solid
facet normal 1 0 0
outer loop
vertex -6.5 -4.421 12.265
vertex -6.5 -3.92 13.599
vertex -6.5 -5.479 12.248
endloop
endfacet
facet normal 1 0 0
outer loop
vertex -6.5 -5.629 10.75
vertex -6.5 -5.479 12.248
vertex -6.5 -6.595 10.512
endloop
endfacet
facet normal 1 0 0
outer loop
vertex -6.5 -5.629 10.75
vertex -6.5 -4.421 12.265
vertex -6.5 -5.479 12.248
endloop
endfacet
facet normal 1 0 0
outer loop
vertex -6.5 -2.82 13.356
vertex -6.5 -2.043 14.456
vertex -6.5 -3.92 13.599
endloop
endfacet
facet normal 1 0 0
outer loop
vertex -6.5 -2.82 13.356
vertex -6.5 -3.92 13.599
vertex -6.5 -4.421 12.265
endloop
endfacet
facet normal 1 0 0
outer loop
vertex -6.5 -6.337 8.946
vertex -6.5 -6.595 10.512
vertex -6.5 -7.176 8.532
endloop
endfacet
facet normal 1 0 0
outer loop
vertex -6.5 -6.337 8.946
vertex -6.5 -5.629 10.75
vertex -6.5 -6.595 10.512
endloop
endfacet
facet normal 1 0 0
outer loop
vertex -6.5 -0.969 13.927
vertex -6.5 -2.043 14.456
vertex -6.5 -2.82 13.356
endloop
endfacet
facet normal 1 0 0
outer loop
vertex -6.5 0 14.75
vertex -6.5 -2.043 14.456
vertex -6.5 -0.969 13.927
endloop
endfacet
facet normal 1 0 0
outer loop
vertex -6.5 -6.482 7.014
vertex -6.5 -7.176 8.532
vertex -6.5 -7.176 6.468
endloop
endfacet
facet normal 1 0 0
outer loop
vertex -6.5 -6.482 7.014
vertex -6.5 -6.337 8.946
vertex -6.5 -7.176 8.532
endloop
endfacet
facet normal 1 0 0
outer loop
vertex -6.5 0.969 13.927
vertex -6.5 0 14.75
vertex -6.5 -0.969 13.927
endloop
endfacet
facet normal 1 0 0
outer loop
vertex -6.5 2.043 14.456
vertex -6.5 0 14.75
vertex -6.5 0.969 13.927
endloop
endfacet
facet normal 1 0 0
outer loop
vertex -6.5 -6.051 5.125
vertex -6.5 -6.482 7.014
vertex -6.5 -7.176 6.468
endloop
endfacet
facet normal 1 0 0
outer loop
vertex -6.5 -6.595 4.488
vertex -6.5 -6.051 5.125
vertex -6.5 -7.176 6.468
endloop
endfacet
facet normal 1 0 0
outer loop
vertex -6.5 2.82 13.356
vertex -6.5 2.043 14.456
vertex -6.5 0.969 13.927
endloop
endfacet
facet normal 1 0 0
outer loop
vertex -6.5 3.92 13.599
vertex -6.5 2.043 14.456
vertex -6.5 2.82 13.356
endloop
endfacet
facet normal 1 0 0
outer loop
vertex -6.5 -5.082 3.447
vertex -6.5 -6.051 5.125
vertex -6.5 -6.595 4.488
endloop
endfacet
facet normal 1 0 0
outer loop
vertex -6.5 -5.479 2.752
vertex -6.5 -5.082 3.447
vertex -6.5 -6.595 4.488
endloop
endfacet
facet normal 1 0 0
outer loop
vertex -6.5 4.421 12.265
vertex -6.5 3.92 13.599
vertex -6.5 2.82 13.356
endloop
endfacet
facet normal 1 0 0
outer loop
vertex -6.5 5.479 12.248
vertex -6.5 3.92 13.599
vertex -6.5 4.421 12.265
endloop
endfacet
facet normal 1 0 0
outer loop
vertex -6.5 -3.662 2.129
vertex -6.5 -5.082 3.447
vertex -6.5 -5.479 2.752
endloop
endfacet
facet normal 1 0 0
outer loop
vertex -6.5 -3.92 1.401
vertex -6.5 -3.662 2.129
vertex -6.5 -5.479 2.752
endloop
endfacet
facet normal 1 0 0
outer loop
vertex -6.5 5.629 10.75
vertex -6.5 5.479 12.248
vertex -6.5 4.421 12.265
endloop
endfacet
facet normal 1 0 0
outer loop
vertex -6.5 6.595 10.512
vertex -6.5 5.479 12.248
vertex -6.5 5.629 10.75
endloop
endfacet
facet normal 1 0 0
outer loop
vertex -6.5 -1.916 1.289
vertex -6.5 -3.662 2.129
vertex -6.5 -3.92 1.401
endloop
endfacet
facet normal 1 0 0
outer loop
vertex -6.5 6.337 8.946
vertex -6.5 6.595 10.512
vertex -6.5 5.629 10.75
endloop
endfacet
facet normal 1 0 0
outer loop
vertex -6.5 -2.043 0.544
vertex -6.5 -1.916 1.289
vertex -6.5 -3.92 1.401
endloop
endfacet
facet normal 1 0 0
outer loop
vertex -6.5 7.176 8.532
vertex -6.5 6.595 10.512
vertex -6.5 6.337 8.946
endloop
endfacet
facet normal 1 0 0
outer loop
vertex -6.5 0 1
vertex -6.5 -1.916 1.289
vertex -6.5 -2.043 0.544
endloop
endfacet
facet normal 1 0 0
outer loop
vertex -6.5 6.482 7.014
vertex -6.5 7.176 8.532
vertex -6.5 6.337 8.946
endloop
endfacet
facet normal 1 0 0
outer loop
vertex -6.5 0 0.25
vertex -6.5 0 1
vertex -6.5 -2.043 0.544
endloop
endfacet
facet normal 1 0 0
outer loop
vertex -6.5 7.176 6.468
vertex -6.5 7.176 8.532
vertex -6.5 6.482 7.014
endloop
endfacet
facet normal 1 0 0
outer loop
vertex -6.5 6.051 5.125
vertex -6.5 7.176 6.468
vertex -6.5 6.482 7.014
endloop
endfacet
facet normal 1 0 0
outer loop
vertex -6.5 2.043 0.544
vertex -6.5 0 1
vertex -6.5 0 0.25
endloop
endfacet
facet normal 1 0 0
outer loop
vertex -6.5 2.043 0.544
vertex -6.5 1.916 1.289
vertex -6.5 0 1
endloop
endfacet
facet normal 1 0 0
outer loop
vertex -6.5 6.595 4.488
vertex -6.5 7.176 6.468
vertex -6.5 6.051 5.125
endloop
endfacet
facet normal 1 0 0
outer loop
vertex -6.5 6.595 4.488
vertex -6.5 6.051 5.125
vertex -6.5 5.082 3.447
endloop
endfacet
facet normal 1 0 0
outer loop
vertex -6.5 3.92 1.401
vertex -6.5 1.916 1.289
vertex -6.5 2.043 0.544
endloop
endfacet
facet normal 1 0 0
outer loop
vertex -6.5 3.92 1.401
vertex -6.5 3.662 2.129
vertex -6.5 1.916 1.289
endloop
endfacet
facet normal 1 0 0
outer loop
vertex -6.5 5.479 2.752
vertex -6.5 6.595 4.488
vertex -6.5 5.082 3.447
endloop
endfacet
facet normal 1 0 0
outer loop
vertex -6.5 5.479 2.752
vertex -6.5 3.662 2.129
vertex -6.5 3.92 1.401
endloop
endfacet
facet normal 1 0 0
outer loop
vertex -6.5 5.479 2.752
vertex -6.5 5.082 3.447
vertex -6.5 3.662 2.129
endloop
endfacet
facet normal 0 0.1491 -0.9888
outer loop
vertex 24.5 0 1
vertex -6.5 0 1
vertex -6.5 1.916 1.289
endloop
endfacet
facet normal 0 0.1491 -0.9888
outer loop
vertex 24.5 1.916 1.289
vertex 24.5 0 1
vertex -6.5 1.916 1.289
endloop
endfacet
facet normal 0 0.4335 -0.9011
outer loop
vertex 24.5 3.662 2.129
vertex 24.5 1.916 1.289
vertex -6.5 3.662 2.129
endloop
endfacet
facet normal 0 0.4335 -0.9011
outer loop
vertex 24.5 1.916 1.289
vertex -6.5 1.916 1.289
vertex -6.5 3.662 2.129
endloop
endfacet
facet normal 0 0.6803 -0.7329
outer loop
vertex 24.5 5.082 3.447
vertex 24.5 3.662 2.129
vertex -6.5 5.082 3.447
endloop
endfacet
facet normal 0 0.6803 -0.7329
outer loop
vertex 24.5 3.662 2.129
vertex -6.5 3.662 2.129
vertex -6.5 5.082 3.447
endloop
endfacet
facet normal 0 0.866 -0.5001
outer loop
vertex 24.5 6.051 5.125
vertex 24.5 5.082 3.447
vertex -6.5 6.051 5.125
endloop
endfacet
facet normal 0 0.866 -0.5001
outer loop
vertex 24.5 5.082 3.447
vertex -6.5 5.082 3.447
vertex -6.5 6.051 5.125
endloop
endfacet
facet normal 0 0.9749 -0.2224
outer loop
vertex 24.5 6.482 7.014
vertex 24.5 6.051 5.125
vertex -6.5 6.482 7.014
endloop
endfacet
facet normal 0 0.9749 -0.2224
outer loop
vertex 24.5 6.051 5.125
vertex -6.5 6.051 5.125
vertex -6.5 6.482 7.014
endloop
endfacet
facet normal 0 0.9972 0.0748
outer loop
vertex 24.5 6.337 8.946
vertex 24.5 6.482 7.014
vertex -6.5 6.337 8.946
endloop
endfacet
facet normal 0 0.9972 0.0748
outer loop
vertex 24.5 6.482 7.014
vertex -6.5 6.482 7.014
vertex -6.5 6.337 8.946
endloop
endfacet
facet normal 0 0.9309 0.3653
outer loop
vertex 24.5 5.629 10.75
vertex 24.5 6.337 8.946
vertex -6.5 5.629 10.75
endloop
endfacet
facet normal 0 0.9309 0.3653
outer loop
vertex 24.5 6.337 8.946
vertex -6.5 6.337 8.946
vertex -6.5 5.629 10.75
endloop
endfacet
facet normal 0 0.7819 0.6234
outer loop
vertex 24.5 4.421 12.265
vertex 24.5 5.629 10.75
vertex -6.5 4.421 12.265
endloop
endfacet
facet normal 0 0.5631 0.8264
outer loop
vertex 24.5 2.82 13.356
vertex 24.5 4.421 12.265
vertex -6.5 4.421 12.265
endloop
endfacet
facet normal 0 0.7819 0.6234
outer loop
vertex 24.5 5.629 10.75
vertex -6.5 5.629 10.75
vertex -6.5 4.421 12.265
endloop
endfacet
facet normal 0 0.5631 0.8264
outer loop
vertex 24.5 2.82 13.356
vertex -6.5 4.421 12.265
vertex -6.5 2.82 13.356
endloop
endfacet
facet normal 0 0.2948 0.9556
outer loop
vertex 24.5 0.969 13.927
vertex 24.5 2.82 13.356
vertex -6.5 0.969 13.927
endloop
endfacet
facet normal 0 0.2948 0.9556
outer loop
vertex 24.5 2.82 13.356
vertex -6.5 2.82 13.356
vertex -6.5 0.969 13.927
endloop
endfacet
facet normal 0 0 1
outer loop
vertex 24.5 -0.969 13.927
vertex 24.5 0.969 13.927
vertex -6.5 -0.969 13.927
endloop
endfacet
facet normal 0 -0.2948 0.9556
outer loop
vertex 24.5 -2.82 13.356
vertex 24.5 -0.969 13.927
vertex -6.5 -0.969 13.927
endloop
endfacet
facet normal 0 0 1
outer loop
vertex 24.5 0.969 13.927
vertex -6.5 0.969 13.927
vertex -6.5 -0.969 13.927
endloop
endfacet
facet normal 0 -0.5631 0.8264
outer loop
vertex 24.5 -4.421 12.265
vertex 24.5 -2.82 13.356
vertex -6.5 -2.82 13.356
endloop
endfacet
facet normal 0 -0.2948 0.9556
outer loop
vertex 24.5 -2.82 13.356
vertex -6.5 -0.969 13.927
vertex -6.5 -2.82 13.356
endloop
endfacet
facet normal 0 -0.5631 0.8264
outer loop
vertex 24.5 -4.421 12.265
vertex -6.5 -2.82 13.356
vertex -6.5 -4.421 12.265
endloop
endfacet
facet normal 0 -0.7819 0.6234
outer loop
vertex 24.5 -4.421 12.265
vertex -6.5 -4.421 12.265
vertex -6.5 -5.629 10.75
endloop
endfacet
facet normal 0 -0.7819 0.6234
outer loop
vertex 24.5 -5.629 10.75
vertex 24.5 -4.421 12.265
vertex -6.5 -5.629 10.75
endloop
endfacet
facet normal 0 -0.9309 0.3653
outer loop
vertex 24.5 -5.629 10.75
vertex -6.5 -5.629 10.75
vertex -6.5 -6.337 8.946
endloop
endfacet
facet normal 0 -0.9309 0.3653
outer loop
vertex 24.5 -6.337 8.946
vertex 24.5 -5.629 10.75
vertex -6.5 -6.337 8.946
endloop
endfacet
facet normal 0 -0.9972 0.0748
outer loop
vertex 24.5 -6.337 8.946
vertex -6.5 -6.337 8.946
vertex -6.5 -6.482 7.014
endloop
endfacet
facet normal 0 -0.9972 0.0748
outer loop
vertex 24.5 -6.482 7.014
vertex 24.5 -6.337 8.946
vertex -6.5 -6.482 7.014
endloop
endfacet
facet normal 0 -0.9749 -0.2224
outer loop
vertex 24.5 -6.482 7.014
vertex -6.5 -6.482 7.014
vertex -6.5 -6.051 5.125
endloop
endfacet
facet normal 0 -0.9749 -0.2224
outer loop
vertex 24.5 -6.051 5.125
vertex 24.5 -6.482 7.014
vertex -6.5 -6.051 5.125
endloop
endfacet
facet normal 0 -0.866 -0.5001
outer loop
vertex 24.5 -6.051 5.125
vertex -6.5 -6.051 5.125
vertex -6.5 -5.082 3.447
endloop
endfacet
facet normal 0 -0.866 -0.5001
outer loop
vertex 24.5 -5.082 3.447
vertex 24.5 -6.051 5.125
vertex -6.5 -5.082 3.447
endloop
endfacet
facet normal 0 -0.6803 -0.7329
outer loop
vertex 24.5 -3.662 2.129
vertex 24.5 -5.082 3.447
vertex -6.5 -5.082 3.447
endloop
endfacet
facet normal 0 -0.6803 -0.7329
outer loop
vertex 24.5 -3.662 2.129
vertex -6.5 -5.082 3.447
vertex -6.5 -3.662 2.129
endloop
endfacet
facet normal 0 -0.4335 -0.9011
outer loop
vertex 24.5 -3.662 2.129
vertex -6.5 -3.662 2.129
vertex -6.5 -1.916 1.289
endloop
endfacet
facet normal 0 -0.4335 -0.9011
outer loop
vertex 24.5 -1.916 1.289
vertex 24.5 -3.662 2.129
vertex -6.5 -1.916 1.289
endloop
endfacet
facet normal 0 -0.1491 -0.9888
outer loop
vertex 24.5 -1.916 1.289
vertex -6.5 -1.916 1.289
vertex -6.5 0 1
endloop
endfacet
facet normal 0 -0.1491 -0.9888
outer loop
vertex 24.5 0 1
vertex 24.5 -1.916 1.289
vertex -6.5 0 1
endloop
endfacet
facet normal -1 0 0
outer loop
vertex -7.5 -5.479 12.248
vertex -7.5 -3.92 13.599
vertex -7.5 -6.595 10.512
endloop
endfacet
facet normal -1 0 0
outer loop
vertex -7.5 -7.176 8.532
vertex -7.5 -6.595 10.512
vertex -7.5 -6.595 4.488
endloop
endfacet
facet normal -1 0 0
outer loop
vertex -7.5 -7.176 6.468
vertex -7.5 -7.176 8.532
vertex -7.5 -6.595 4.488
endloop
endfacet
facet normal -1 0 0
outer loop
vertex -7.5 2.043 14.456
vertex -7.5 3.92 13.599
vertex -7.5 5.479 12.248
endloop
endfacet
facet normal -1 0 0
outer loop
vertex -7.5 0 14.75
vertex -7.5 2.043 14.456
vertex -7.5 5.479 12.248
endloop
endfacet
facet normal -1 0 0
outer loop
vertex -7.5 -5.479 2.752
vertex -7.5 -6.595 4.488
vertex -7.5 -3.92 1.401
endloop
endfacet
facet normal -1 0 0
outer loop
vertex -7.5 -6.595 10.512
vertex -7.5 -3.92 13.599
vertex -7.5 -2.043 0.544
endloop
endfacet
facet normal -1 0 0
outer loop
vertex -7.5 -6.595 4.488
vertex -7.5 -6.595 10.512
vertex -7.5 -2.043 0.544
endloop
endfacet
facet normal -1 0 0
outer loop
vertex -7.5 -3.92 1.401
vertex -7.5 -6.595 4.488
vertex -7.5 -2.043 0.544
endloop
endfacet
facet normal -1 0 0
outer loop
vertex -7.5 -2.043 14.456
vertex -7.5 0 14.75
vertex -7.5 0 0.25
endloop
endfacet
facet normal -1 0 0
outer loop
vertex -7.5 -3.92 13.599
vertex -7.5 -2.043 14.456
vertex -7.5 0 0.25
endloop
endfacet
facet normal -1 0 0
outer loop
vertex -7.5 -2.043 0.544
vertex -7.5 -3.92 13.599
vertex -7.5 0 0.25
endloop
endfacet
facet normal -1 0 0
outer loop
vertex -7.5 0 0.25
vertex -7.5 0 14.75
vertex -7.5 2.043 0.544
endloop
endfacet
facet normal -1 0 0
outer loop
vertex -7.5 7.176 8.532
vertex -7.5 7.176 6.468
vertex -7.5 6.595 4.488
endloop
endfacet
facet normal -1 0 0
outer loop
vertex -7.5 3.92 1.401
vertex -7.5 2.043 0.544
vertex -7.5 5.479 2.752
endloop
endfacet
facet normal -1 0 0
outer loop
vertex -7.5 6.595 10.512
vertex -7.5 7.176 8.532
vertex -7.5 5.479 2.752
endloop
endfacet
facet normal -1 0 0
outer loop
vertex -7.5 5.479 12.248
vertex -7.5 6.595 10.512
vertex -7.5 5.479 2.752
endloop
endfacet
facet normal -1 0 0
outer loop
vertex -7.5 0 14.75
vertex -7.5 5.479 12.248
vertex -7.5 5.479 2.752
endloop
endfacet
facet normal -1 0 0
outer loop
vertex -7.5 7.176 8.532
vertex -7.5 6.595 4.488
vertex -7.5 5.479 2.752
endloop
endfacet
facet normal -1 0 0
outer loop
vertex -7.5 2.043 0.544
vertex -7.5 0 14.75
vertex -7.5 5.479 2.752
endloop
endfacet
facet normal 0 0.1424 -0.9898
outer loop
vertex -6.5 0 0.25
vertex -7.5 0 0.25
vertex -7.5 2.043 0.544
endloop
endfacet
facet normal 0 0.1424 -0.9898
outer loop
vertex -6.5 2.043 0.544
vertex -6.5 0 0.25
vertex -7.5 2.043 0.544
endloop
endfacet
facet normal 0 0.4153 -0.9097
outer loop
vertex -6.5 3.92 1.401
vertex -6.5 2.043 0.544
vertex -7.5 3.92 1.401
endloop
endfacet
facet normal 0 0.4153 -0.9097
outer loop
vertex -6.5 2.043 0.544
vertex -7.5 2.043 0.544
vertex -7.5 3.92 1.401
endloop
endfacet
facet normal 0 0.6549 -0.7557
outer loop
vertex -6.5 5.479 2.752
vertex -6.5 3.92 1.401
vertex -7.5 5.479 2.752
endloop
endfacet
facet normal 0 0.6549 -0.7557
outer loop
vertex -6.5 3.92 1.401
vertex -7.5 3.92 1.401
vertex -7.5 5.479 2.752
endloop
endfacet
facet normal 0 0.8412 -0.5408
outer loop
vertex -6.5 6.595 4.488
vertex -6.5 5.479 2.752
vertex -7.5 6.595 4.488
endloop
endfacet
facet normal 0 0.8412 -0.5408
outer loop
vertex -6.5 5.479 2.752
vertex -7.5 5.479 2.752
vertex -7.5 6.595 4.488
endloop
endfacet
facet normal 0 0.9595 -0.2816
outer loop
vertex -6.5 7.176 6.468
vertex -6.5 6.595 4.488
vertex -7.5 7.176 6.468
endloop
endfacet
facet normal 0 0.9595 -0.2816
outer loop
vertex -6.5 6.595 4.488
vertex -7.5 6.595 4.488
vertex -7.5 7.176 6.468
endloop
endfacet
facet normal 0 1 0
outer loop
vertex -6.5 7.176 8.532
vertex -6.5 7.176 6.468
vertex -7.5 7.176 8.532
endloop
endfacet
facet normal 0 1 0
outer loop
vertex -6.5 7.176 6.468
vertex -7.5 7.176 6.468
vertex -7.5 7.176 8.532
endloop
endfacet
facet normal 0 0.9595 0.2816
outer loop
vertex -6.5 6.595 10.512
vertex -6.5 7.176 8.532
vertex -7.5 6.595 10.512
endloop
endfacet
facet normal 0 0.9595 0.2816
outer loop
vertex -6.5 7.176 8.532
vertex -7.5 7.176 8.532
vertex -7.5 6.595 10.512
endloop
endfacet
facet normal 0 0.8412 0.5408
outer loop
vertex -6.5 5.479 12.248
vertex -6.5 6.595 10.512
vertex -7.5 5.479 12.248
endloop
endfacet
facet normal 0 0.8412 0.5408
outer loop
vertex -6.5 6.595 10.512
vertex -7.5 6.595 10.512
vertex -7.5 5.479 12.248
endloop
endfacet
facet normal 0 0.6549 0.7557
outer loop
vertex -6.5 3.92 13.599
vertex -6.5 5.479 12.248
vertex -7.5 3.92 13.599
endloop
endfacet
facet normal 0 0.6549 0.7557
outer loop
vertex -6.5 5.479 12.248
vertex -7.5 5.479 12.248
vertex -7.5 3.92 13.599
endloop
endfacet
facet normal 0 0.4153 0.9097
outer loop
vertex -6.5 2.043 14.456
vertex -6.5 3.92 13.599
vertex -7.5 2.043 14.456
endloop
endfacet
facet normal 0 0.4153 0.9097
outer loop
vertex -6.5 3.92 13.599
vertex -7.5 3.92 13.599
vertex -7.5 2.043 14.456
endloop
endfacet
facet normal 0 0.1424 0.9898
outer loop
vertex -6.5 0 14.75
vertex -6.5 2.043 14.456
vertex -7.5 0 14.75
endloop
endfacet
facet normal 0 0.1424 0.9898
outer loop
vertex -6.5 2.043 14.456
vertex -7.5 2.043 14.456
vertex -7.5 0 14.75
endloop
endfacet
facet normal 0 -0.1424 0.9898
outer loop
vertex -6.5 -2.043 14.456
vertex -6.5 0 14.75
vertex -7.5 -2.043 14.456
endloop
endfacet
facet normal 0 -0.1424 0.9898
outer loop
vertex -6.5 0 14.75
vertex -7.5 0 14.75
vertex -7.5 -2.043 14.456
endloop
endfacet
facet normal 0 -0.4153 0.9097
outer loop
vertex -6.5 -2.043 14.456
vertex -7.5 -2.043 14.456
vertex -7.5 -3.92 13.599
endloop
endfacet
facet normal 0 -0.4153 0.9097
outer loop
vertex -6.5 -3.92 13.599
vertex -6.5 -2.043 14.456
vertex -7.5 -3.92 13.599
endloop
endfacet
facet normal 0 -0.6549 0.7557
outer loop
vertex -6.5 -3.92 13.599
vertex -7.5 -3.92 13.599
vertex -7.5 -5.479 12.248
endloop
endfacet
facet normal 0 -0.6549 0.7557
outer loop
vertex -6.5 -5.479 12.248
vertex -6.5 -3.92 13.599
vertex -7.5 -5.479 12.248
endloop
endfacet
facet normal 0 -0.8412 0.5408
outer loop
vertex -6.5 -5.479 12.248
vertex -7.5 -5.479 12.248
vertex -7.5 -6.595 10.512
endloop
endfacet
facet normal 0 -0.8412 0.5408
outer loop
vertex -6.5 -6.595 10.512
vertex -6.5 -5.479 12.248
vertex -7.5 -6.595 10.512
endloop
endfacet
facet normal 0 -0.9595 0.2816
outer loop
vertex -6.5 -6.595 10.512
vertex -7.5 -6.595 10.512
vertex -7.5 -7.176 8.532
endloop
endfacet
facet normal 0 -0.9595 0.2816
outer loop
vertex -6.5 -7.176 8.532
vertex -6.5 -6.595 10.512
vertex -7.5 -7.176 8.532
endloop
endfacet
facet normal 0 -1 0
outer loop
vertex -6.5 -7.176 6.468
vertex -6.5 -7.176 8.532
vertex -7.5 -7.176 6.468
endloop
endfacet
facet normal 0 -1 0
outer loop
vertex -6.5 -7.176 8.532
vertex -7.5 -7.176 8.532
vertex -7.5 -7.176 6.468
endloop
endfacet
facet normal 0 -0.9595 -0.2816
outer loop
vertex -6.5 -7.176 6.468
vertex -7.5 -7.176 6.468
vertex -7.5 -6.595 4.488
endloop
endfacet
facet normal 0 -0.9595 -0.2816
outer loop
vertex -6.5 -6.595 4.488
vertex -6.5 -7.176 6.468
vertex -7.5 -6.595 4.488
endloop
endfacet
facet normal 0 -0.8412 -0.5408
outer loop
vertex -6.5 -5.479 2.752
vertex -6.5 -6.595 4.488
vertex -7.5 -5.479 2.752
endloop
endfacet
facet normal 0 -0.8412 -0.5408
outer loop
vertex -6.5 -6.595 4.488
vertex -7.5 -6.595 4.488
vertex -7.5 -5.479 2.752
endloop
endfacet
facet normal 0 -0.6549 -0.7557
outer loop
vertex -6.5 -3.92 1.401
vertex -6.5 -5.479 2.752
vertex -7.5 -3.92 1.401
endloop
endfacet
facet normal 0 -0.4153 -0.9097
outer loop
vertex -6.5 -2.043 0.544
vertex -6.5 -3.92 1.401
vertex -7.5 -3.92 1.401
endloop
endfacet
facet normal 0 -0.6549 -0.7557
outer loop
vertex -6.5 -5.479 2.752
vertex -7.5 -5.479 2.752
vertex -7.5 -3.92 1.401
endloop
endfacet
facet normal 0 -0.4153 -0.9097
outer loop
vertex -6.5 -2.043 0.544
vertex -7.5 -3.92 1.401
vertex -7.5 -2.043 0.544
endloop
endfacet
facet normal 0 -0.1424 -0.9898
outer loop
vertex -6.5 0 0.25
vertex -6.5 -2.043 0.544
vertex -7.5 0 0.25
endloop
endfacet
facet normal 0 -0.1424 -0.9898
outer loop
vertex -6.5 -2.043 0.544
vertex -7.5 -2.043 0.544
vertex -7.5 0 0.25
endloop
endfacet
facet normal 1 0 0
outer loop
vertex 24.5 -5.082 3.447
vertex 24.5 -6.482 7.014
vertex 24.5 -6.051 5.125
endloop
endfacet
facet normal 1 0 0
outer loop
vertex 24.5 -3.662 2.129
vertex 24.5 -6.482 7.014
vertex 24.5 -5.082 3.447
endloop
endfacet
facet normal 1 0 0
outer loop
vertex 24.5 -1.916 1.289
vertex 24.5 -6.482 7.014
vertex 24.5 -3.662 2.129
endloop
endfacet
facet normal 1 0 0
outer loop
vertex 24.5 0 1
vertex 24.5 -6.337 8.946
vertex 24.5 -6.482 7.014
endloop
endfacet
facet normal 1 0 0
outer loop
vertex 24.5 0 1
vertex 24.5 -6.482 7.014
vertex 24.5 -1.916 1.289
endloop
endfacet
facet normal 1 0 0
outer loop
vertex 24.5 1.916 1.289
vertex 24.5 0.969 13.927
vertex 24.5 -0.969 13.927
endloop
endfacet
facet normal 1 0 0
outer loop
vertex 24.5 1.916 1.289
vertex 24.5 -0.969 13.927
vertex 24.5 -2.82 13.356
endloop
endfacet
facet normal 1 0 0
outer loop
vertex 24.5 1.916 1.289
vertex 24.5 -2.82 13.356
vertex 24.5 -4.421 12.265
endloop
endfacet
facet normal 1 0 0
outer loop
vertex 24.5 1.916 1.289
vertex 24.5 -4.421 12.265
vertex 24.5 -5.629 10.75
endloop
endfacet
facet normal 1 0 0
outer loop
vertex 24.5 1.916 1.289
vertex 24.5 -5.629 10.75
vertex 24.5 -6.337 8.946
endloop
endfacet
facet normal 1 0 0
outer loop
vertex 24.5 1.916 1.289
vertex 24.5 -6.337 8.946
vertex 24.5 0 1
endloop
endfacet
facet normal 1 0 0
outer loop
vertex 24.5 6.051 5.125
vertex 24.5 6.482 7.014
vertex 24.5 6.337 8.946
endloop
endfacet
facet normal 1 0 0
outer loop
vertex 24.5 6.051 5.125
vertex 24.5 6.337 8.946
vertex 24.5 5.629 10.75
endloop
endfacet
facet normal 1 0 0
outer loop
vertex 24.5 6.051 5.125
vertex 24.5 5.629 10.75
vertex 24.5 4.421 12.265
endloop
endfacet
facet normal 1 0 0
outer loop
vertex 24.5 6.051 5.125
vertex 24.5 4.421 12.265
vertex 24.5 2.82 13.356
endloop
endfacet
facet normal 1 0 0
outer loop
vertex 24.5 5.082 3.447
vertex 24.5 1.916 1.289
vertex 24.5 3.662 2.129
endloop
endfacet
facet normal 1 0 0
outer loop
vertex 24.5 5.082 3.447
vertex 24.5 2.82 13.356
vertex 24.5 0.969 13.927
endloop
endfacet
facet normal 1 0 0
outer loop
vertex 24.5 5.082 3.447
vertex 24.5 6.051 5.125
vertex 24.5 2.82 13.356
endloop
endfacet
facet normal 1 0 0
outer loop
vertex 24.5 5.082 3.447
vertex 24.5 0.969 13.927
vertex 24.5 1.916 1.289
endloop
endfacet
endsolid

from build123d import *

# Parameters (mm, degrees)
CYLINDER001_R          = 7.25
CYLINDER001_DEPTH      = 1
CYLINDER_R             = 6.5
CYLINDER_DEPTH         = 32
FUSION_PLACEMENT_ANGLE = 90


with BuildPart() as cylinder001:
    # Cylinder001 → Cylinder001 (new body)
    with BuildSketch(Plane.XY):
        Circle(CYLINDER001_R)
    extrude(amount=CYLINDER001_DEPTH)


with BuildPart() as lasermoduletemplate:
    # Cylinder → Cylinder (new body)
    with BuildSketch(Plane.XY):
        Circle(CYLINDER_R)
    extrude(amount=CYLINDER_DEPTH)

    # Fusion: union Cylinder001
    add(cylinder001.part)


with BuildPart() as lasermoduletemplate_1:
    # Fusion placement: moved
    add(lasermoduletemplate.part.moved(Location((-7.5, 0, 7.5))).rotate(Axis((-7.5, 0, 7.5), (0, 1, 0)), FUSION_PLACEMENT_ANGLE))


solid = lasermoduletemplate_1.part
